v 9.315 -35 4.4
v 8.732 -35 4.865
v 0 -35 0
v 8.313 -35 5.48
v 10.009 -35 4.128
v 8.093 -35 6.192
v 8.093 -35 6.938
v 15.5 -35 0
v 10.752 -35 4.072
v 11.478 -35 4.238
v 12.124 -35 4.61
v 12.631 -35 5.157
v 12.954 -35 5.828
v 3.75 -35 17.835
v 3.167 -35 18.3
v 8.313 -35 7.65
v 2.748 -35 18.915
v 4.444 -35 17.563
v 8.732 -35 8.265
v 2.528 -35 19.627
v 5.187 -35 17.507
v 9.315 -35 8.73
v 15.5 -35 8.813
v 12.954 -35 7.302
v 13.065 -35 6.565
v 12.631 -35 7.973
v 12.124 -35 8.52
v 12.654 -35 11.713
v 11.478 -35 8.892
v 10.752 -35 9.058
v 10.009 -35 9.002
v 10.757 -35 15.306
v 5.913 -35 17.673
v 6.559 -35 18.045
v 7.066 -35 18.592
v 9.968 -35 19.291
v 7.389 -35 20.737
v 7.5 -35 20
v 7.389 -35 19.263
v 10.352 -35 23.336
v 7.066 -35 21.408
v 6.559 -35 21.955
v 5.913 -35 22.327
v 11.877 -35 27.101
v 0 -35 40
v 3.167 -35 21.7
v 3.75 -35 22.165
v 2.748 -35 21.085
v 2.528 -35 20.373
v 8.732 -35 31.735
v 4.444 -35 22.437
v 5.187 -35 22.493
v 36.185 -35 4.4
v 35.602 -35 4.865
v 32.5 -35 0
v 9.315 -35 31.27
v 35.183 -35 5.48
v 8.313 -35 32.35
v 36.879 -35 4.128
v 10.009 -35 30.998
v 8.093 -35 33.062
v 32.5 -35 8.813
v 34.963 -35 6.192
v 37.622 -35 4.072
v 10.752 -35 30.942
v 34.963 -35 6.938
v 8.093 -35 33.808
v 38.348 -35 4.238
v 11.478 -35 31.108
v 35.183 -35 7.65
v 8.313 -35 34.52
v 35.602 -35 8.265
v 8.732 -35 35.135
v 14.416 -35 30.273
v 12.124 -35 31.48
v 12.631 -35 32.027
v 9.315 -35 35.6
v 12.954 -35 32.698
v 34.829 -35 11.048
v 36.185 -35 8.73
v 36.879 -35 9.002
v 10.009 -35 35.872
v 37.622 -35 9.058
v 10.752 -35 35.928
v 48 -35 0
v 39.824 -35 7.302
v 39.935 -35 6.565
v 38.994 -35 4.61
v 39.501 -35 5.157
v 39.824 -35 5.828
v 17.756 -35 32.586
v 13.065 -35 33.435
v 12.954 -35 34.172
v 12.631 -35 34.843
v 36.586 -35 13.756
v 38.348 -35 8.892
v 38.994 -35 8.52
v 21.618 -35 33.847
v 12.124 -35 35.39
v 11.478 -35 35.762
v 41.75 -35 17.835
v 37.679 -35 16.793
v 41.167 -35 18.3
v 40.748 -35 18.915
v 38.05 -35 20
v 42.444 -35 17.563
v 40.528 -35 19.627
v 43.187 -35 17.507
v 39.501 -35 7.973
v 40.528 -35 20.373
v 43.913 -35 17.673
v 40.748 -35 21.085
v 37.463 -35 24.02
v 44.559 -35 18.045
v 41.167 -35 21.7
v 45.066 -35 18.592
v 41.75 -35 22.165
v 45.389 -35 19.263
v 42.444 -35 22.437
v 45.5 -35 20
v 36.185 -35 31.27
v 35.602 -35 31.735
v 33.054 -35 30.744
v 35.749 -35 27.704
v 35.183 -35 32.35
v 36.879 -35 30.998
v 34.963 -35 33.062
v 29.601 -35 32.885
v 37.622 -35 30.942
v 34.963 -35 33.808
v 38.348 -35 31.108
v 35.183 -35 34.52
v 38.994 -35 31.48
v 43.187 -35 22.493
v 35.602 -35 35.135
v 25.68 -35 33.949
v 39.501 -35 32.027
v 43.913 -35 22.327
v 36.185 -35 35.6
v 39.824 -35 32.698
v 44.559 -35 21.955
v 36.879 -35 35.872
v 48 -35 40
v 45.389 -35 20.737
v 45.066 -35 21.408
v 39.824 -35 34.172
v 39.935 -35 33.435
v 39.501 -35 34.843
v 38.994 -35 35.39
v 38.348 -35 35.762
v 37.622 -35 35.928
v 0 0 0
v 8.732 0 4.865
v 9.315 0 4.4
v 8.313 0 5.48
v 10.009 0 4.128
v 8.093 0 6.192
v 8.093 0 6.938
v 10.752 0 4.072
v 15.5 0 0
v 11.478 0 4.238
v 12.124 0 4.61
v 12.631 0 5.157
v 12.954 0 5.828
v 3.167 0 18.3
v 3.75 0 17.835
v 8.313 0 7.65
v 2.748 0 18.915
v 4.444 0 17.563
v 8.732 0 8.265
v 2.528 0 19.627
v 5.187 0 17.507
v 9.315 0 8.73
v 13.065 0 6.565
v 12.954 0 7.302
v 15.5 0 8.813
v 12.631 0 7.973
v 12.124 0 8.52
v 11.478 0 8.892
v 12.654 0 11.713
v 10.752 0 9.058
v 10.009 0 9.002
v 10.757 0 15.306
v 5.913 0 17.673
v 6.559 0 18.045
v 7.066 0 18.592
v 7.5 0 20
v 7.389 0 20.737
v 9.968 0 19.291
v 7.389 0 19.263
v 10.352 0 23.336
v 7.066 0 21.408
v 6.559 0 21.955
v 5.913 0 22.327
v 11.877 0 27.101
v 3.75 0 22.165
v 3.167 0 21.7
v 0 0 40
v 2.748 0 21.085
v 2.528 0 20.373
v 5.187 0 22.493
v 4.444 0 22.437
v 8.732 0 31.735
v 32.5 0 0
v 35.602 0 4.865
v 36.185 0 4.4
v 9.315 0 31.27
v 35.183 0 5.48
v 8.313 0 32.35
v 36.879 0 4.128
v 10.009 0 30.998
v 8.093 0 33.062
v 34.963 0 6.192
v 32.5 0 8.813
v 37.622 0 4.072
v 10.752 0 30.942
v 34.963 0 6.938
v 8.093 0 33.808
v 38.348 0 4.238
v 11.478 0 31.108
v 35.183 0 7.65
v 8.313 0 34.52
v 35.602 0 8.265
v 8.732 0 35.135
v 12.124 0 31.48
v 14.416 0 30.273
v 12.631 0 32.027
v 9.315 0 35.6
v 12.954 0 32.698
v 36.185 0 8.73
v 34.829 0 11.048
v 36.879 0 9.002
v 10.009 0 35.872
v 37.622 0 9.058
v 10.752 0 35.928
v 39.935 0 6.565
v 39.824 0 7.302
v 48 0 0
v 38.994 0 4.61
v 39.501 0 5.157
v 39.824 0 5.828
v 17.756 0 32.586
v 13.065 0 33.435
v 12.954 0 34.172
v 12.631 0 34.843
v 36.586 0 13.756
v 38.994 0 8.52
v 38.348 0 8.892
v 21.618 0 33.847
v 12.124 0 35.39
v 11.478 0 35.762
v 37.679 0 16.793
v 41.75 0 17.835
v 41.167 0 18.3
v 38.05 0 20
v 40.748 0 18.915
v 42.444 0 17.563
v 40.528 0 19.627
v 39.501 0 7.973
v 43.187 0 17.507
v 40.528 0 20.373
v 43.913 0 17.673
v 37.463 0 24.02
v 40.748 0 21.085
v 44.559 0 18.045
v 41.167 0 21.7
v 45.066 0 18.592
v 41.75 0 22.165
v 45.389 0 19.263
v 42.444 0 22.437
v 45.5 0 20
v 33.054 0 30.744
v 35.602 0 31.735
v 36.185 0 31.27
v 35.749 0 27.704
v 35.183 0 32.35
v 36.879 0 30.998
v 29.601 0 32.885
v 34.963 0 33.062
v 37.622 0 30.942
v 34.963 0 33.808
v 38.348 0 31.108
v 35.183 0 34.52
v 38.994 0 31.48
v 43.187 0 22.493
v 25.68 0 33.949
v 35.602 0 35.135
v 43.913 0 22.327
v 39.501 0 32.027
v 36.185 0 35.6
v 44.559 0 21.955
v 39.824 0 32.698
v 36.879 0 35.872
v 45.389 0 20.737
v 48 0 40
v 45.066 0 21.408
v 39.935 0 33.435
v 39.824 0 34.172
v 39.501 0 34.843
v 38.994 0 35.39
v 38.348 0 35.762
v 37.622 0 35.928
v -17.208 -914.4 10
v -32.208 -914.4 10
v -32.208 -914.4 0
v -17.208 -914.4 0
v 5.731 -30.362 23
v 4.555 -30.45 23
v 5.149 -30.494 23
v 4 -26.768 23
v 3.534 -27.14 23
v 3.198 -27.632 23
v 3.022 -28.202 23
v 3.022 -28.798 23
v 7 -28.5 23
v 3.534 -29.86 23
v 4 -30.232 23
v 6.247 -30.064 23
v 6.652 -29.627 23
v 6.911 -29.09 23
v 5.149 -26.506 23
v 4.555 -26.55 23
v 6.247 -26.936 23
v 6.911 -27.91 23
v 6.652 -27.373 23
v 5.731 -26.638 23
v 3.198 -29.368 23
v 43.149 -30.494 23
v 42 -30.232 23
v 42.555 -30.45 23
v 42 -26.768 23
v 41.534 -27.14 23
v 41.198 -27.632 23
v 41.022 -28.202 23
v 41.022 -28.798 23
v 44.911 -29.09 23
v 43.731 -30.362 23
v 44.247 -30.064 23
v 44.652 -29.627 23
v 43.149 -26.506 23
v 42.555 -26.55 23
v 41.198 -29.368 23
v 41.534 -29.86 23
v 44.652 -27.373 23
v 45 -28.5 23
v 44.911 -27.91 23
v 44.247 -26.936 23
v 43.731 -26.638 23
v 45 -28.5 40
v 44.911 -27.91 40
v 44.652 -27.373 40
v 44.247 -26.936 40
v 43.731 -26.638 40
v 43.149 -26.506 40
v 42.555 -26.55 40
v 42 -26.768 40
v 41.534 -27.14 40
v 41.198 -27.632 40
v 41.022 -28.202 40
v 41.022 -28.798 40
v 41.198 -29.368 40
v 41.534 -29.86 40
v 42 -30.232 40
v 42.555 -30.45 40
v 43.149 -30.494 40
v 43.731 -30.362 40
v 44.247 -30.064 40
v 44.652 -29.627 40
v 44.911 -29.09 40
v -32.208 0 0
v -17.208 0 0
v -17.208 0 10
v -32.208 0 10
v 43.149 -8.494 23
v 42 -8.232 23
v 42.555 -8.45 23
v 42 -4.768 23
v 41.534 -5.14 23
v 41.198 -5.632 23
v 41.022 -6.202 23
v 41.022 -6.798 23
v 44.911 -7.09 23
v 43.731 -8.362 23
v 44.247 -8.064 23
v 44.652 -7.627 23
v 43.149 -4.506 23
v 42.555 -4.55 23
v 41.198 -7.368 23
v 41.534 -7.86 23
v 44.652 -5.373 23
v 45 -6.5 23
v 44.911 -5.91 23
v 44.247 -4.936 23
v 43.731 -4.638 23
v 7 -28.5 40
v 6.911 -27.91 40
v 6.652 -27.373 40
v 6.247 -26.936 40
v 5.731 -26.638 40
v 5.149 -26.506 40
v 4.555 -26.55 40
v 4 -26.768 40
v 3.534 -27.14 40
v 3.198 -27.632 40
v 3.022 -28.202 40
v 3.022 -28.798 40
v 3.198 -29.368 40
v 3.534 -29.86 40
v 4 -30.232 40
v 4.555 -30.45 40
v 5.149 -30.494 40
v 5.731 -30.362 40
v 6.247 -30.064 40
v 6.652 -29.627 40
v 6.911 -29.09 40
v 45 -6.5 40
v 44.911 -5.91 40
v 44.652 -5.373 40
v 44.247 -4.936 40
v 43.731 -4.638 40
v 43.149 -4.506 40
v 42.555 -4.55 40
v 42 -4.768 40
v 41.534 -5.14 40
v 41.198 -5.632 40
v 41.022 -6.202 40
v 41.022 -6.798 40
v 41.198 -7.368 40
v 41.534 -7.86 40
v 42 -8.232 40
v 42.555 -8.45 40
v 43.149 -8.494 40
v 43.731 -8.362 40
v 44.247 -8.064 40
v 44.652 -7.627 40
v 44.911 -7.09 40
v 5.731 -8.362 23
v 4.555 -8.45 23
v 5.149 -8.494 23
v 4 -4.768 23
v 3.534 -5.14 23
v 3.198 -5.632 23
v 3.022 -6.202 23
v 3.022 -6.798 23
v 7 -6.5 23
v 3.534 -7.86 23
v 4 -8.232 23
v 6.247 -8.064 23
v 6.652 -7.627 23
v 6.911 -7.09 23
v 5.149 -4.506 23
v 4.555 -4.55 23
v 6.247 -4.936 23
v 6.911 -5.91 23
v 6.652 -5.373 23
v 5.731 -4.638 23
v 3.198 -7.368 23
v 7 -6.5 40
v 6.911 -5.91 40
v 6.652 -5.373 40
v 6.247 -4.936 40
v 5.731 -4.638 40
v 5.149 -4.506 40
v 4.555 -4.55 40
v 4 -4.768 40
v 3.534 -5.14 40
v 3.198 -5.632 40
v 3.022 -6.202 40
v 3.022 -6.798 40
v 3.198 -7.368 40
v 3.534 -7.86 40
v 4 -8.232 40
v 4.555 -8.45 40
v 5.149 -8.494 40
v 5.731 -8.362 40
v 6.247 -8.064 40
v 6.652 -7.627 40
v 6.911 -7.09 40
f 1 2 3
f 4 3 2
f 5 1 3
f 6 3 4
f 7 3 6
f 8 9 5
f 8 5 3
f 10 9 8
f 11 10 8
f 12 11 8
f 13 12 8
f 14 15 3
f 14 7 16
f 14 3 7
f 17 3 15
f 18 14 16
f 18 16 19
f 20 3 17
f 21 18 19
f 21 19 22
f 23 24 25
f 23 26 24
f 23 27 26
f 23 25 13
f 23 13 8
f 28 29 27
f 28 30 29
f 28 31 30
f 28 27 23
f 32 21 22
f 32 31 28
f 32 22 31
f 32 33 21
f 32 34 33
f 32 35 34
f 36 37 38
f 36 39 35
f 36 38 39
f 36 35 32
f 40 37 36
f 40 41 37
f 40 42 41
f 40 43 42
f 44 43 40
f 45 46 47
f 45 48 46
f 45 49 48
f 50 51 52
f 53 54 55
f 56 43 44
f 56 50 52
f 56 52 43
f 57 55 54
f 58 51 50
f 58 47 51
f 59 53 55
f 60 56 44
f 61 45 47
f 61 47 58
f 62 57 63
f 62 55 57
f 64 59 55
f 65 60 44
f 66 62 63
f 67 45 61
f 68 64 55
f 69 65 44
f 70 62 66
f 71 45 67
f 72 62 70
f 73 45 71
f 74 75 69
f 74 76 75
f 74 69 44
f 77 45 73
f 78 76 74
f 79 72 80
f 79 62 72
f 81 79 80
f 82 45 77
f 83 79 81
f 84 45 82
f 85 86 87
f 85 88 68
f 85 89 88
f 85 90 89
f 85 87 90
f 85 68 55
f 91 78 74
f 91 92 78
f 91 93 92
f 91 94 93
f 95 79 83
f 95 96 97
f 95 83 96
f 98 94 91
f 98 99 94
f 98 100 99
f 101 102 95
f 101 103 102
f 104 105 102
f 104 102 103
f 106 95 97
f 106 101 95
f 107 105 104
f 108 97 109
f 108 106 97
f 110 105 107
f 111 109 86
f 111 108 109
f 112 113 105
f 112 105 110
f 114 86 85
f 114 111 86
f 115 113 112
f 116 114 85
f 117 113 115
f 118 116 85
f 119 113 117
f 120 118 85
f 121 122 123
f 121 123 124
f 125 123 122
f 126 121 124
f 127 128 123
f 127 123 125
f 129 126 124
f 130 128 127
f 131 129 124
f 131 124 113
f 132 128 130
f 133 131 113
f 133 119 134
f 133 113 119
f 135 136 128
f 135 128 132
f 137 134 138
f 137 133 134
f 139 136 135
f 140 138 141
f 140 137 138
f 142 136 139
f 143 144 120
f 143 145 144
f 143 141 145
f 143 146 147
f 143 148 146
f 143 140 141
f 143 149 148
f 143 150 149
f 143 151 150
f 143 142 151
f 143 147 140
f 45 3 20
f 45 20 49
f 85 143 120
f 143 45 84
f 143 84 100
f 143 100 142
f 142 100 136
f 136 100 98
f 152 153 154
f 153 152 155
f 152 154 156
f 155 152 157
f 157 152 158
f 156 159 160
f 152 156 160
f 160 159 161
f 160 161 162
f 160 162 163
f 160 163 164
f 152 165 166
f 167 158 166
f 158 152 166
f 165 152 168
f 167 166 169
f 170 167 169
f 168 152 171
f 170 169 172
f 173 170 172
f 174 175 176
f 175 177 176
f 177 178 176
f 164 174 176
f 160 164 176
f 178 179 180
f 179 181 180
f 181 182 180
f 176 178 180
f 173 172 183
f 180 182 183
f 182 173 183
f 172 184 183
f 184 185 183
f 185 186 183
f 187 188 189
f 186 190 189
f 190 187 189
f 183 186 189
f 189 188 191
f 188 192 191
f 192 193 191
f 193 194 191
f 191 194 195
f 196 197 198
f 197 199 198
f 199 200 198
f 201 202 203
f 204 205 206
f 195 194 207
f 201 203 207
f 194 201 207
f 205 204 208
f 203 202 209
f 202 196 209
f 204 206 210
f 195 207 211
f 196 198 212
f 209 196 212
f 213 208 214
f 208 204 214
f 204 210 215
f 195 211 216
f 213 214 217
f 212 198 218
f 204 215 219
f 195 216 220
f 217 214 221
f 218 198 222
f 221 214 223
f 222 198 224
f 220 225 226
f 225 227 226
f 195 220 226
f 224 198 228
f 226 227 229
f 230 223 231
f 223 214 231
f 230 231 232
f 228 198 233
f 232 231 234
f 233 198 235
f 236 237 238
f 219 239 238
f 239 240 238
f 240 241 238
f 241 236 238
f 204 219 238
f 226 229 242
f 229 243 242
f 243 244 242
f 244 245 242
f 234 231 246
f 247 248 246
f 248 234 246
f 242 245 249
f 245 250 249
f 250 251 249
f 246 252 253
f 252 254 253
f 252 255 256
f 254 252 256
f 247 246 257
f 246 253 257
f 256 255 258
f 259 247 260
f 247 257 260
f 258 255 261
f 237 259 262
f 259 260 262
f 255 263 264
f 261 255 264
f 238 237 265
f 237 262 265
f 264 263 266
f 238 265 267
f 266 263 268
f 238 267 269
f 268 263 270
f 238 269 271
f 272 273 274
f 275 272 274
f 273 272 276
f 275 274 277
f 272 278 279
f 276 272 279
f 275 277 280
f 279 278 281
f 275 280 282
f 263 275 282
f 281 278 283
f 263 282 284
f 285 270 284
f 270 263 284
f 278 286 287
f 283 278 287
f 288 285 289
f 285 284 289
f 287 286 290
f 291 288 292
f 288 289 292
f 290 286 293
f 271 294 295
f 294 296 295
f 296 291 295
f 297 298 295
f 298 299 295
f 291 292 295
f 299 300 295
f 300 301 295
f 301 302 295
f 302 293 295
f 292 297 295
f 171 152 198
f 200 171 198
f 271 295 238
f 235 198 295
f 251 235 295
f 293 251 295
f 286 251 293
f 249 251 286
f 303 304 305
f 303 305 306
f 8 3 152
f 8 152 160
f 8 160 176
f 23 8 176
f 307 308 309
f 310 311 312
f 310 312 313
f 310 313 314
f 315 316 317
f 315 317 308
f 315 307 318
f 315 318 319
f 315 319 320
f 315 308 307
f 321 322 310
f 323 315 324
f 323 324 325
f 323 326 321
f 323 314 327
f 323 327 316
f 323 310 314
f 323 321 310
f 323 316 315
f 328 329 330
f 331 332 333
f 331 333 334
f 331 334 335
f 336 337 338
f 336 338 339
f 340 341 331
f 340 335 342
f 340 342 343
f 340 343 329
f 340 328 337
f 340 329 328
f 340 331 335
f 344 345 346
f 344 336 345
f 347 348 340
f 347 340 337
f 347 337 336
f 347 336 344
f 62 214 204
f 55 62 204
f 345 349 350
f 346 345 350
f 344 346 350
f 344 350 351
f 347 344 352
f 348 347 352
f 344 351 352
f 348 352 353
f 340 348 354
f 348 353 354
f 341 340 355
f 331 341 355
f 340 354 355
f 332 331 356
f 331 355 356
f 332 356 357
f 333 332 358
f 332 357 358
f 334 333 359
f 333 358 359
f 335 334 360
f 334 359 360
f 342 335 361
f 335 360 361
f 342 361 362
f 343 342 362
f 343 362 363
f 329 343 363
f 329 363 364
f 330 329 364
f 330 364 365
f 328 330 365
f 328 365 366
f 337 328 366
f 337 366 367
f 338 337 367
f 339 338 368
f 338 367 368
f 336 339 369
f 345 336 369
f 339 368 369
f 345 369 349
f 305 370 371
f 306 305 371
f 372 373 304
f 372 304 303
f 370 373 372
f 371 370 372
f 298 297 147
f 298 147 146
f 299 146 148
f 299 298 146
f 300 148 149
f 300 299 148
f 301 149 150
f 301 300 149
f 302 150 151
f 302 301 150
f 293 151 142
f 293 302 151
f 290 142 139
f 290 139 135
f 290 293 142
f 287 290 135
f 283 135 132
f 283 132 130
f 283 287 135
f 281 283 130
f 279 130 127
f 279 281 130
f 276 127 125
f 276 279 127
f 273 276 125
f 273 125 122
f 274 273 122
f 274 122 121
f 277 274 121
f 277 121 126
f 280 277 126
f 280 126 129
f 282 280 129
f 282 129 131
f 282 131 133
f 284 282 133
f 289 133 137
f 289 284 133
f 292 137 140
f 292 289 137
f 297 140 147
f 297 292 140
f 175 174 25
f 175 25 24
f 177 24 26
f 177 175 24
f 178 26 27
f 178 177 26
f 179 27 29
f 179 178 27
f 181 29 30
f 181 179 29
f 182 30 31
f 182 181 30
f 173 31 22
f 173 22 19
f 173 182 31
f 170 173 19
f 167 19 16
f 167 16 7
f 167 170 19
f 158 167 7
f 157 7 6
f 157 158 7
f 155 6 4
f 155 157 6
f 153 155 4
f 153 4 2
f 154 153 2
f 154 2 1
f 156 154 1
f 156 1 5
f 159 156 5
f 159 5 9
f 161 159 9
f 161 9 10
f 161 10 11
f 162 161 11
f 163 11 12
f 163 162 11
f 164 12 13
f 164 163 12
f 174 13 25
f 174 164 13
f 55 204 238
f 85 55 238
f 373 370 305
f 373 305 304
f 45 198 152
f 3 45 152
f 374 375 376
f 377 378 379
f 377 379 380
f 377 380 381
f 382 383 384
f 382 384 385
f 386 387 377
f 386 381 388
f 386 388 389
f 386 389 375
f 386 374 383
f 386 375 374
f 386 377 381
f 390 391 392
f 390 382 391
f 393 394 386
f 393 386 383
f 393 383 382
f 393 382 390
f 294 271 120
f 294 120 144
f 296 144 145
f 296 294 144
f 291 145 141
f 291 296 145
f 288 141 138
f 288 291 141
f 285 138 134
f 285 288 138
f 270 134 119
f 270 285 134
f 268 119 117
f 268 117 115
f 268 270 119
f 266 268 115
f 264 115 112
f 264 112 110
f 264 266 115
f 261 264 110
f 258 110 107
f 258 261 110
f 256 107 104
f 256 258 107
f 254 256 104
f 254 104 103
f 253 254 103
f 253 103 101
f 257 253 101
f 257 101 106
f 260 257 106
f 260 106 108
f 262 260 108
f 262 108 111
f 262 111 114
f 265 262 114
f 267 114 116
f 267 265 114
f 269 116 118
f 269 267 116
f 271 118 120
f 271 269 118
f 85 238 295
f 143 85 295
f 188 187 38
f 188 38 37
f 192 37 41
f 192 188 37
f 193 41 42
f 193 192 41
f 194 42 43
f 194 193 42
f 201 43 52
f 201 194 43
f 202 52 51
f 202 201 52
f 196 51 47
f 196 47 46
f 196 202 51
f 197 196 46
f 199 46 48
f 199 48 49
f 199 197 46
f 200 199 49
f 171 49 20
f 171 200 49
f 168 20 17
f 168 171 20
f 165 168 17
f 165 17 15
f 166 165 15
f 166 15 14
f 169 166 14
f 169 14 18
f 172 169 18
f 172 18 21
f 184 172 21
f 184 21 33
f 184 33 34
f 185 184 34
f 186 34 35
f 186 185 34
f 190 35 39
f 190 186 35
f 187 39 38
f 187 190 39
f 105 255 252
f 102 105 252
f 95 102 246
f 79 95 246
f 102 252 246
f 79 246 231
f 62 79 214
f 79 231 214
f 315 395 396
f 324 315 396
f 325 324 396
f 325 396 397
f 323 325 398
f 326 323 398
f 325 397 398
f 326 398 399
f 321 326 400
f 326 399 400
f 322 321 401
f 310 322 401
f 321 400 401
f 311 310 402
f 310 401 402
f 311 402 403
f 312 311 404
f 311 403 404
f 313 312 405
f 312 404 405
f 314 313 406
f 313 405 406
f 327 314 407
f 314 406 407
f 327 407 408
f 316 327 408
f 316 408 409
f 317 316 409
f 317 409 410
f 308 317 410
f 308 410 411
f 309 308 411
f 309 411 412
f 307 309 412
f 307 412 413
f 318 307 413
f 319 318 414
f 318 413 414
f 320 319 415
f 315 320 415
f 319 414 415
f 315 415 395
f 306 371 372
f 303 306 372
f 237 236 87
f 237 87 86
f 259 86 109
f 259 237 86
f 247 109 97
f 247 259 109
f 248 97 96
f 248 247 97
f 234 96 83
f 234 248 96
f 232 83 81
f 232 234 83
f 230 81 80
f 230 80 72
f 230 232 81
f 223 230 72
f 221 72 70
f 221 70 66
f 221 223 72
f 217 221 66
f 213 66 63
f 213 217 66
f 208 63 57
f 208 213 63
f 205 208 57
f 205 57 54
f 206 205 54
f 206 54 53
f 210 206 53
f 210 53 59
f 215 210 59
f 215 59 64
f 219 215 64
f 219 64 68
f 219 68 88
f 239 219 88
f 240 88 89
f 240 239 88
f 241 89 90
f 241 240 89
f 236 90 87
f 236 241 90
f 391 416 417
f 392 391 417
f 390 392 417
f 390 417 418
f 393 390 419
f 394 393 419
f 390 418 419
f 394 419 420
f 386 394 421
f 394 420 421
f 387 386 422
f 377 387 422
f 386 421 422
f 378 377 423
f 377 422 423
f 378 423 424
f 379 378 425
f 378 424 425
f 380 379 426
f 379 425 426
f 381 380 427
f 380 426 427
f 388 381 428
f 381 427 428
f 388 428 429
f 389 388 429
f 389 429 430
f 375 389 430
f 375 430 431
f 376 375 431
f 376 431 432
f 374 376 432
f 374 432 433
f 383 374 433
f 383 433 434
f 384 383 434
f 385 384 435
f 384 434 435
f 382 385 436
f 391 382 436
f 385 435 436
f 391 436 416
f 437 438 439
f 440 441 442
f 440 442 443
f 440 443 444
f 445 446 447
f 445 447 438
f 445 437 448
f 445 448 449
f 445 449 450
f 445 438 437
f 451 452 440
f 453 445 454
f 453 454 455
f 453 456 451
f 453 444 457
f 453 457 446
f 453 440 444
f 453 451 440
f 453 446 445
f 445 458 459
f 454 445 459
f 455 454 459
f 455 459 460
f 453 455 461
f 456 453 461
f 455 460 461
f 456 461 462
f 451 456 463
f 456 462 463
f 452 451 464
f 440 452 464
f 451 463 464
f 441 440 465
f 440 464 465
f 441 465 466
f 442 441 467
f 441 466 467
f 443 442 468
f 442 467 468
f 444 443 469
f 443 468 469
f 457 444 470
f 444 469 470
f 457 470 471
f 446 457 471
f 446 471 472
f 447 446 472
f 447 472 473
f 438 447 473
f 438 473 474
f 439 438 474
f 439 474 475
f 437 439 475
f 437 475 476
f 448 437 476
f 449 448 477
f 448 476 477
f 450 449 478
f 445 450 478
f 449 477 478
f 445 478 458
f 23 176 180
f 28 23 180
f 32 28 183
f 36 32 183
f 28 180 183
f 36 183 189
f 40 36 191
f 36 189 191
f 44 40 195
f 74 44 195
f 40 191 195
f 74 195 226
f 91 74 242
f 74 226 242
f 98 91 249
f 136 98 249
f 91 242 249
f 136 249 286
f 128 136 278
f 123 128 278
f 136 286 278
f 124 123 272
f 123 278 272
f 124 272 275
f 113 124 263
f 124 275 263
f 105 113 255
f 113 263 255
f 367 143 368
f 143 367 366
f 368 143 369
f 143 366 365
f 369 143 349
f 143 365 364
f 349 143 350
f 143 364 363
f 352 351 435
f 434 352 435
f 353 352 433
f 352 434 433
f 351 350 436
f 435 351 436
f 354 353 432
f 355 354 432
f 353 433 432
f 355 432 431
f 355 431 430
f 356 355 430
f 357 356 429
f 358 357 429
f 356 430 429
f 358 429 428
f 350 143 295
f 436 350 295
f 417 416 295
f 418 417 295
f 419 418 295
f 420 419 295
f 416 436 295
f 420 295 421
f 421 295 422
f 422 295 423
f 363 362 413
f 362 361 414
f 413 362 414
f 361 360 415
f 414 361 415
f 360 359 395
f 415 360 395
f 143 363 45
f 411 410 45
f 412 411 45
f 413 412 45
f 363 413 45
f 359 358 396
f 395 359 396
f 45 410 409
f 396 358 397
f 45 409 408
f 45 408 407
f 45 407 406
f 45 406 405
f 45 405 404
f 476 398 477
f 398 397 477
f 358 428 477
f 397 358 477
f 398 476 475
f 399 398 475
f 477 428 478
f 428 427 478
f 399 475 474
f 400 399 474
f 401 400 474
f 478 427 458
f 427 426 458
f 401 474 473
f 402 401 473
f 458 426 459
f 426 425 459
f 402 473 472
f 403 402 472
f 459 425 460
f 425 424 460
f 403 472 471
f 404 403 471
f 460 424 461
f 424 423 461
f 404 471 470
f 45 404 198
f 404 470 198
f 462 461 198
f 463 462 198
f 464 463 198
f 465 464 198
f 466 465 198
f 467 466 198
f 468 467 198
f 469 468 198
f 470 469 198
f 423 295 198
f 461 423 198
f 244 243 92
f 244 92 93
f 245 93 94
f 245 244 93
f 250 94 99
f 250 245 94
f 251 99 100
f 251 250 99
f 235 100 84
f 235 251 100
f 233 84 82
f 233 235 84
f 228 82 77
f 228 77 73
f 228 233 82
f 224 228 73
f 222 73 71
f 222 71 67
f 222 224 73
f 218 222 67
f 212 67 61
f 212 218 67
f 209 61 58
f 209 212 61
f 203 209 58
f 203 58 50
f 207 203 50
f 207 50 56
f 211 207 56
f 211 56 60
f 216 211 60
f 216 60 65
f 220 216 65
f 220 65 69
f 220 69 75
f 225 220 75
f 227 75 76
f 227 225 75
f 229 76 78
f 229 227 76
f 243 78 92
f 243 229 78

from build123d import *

# Parameters (mm, degrees)
F0_R     = 2.5
F1_DEPTH = 35
F2_R     = 2
F3_DEPTH = 17
F4_W     = 15
F4_H     = 10
F5_DEPTH = 914.4


with BuildPart() as f1:
    # F0 (on Front) → F1 (new body)
    with BuildSketch(Plane.XZ):
        with BuildLine():
            Line((0, 40), (0, 0))
            Line((0, 0), (15.5, 0))
            Line((15.5, 0), (15.5, 8.812842))
            ThreePointArc((15.5, 8.812842), (17.755903, 32.586252), (38.05, 20))
            ThreePointArc((38.05, 20), (36.586252, 13.755903), (32.5, 8.812842))
            Line((32.5, 8.812842), (32.5, 0))
            Line((32.5, 0), (48, 0))
            Line((48, 0), (48, 40))
            Line((48, 40), (0, 40))
        make_face()
        with Locations((10.564971, 6.564971)):
            Circle(F0_R, mode=Mode.SUBTRACT)
        with Locations((37.435029, 6.564971)):
            Circle(F0_R, mode=Mode.SUBTRACT)
        with Locations((5, 20)):
            Circle(F0_R, mode=Mode.SUBTRACT)
        with Locations((10.564971, 33.435029)):
            Circle(F0_R, mode=Mode.SUBTRACT)
        with Locations((43, 20)):
            Circle(F0_R, mode=Mode.SUBTRACT)
        with Locations((37.435029, 33.435029)):
            Circle(F0_R, mode=Mode.SUBTRACT)
    extrude(amount=F1_DEPTH)

    # F2 (on face) → F3 (cut)
    with BuildSketch(Plane.XY.offset(40)):
        with Locations((43, -6.5)):
            Circle(F2_R)
        with Locations((43, -28.5)):
            Circle(F2_R)
        with Locations((5, -6.5)):
            Circle(F2_R)
        with Locations((5, -28.5)):
            Circle(F2_R)
    extrude(amount=-F3_DEPTH, mode=Mode.SUBTRACT)


with BuildPart() as f5:
    # F4 (on Front) → F5 (new body)
    with BuildSketch(Plane.XZ):
        with Locations((-24.708313, 5)):
            Rectangle(F4_W, F4_H)
    extrude(amount=F5_DEPTH)


solid = Compound([f1.part, f5.part])
